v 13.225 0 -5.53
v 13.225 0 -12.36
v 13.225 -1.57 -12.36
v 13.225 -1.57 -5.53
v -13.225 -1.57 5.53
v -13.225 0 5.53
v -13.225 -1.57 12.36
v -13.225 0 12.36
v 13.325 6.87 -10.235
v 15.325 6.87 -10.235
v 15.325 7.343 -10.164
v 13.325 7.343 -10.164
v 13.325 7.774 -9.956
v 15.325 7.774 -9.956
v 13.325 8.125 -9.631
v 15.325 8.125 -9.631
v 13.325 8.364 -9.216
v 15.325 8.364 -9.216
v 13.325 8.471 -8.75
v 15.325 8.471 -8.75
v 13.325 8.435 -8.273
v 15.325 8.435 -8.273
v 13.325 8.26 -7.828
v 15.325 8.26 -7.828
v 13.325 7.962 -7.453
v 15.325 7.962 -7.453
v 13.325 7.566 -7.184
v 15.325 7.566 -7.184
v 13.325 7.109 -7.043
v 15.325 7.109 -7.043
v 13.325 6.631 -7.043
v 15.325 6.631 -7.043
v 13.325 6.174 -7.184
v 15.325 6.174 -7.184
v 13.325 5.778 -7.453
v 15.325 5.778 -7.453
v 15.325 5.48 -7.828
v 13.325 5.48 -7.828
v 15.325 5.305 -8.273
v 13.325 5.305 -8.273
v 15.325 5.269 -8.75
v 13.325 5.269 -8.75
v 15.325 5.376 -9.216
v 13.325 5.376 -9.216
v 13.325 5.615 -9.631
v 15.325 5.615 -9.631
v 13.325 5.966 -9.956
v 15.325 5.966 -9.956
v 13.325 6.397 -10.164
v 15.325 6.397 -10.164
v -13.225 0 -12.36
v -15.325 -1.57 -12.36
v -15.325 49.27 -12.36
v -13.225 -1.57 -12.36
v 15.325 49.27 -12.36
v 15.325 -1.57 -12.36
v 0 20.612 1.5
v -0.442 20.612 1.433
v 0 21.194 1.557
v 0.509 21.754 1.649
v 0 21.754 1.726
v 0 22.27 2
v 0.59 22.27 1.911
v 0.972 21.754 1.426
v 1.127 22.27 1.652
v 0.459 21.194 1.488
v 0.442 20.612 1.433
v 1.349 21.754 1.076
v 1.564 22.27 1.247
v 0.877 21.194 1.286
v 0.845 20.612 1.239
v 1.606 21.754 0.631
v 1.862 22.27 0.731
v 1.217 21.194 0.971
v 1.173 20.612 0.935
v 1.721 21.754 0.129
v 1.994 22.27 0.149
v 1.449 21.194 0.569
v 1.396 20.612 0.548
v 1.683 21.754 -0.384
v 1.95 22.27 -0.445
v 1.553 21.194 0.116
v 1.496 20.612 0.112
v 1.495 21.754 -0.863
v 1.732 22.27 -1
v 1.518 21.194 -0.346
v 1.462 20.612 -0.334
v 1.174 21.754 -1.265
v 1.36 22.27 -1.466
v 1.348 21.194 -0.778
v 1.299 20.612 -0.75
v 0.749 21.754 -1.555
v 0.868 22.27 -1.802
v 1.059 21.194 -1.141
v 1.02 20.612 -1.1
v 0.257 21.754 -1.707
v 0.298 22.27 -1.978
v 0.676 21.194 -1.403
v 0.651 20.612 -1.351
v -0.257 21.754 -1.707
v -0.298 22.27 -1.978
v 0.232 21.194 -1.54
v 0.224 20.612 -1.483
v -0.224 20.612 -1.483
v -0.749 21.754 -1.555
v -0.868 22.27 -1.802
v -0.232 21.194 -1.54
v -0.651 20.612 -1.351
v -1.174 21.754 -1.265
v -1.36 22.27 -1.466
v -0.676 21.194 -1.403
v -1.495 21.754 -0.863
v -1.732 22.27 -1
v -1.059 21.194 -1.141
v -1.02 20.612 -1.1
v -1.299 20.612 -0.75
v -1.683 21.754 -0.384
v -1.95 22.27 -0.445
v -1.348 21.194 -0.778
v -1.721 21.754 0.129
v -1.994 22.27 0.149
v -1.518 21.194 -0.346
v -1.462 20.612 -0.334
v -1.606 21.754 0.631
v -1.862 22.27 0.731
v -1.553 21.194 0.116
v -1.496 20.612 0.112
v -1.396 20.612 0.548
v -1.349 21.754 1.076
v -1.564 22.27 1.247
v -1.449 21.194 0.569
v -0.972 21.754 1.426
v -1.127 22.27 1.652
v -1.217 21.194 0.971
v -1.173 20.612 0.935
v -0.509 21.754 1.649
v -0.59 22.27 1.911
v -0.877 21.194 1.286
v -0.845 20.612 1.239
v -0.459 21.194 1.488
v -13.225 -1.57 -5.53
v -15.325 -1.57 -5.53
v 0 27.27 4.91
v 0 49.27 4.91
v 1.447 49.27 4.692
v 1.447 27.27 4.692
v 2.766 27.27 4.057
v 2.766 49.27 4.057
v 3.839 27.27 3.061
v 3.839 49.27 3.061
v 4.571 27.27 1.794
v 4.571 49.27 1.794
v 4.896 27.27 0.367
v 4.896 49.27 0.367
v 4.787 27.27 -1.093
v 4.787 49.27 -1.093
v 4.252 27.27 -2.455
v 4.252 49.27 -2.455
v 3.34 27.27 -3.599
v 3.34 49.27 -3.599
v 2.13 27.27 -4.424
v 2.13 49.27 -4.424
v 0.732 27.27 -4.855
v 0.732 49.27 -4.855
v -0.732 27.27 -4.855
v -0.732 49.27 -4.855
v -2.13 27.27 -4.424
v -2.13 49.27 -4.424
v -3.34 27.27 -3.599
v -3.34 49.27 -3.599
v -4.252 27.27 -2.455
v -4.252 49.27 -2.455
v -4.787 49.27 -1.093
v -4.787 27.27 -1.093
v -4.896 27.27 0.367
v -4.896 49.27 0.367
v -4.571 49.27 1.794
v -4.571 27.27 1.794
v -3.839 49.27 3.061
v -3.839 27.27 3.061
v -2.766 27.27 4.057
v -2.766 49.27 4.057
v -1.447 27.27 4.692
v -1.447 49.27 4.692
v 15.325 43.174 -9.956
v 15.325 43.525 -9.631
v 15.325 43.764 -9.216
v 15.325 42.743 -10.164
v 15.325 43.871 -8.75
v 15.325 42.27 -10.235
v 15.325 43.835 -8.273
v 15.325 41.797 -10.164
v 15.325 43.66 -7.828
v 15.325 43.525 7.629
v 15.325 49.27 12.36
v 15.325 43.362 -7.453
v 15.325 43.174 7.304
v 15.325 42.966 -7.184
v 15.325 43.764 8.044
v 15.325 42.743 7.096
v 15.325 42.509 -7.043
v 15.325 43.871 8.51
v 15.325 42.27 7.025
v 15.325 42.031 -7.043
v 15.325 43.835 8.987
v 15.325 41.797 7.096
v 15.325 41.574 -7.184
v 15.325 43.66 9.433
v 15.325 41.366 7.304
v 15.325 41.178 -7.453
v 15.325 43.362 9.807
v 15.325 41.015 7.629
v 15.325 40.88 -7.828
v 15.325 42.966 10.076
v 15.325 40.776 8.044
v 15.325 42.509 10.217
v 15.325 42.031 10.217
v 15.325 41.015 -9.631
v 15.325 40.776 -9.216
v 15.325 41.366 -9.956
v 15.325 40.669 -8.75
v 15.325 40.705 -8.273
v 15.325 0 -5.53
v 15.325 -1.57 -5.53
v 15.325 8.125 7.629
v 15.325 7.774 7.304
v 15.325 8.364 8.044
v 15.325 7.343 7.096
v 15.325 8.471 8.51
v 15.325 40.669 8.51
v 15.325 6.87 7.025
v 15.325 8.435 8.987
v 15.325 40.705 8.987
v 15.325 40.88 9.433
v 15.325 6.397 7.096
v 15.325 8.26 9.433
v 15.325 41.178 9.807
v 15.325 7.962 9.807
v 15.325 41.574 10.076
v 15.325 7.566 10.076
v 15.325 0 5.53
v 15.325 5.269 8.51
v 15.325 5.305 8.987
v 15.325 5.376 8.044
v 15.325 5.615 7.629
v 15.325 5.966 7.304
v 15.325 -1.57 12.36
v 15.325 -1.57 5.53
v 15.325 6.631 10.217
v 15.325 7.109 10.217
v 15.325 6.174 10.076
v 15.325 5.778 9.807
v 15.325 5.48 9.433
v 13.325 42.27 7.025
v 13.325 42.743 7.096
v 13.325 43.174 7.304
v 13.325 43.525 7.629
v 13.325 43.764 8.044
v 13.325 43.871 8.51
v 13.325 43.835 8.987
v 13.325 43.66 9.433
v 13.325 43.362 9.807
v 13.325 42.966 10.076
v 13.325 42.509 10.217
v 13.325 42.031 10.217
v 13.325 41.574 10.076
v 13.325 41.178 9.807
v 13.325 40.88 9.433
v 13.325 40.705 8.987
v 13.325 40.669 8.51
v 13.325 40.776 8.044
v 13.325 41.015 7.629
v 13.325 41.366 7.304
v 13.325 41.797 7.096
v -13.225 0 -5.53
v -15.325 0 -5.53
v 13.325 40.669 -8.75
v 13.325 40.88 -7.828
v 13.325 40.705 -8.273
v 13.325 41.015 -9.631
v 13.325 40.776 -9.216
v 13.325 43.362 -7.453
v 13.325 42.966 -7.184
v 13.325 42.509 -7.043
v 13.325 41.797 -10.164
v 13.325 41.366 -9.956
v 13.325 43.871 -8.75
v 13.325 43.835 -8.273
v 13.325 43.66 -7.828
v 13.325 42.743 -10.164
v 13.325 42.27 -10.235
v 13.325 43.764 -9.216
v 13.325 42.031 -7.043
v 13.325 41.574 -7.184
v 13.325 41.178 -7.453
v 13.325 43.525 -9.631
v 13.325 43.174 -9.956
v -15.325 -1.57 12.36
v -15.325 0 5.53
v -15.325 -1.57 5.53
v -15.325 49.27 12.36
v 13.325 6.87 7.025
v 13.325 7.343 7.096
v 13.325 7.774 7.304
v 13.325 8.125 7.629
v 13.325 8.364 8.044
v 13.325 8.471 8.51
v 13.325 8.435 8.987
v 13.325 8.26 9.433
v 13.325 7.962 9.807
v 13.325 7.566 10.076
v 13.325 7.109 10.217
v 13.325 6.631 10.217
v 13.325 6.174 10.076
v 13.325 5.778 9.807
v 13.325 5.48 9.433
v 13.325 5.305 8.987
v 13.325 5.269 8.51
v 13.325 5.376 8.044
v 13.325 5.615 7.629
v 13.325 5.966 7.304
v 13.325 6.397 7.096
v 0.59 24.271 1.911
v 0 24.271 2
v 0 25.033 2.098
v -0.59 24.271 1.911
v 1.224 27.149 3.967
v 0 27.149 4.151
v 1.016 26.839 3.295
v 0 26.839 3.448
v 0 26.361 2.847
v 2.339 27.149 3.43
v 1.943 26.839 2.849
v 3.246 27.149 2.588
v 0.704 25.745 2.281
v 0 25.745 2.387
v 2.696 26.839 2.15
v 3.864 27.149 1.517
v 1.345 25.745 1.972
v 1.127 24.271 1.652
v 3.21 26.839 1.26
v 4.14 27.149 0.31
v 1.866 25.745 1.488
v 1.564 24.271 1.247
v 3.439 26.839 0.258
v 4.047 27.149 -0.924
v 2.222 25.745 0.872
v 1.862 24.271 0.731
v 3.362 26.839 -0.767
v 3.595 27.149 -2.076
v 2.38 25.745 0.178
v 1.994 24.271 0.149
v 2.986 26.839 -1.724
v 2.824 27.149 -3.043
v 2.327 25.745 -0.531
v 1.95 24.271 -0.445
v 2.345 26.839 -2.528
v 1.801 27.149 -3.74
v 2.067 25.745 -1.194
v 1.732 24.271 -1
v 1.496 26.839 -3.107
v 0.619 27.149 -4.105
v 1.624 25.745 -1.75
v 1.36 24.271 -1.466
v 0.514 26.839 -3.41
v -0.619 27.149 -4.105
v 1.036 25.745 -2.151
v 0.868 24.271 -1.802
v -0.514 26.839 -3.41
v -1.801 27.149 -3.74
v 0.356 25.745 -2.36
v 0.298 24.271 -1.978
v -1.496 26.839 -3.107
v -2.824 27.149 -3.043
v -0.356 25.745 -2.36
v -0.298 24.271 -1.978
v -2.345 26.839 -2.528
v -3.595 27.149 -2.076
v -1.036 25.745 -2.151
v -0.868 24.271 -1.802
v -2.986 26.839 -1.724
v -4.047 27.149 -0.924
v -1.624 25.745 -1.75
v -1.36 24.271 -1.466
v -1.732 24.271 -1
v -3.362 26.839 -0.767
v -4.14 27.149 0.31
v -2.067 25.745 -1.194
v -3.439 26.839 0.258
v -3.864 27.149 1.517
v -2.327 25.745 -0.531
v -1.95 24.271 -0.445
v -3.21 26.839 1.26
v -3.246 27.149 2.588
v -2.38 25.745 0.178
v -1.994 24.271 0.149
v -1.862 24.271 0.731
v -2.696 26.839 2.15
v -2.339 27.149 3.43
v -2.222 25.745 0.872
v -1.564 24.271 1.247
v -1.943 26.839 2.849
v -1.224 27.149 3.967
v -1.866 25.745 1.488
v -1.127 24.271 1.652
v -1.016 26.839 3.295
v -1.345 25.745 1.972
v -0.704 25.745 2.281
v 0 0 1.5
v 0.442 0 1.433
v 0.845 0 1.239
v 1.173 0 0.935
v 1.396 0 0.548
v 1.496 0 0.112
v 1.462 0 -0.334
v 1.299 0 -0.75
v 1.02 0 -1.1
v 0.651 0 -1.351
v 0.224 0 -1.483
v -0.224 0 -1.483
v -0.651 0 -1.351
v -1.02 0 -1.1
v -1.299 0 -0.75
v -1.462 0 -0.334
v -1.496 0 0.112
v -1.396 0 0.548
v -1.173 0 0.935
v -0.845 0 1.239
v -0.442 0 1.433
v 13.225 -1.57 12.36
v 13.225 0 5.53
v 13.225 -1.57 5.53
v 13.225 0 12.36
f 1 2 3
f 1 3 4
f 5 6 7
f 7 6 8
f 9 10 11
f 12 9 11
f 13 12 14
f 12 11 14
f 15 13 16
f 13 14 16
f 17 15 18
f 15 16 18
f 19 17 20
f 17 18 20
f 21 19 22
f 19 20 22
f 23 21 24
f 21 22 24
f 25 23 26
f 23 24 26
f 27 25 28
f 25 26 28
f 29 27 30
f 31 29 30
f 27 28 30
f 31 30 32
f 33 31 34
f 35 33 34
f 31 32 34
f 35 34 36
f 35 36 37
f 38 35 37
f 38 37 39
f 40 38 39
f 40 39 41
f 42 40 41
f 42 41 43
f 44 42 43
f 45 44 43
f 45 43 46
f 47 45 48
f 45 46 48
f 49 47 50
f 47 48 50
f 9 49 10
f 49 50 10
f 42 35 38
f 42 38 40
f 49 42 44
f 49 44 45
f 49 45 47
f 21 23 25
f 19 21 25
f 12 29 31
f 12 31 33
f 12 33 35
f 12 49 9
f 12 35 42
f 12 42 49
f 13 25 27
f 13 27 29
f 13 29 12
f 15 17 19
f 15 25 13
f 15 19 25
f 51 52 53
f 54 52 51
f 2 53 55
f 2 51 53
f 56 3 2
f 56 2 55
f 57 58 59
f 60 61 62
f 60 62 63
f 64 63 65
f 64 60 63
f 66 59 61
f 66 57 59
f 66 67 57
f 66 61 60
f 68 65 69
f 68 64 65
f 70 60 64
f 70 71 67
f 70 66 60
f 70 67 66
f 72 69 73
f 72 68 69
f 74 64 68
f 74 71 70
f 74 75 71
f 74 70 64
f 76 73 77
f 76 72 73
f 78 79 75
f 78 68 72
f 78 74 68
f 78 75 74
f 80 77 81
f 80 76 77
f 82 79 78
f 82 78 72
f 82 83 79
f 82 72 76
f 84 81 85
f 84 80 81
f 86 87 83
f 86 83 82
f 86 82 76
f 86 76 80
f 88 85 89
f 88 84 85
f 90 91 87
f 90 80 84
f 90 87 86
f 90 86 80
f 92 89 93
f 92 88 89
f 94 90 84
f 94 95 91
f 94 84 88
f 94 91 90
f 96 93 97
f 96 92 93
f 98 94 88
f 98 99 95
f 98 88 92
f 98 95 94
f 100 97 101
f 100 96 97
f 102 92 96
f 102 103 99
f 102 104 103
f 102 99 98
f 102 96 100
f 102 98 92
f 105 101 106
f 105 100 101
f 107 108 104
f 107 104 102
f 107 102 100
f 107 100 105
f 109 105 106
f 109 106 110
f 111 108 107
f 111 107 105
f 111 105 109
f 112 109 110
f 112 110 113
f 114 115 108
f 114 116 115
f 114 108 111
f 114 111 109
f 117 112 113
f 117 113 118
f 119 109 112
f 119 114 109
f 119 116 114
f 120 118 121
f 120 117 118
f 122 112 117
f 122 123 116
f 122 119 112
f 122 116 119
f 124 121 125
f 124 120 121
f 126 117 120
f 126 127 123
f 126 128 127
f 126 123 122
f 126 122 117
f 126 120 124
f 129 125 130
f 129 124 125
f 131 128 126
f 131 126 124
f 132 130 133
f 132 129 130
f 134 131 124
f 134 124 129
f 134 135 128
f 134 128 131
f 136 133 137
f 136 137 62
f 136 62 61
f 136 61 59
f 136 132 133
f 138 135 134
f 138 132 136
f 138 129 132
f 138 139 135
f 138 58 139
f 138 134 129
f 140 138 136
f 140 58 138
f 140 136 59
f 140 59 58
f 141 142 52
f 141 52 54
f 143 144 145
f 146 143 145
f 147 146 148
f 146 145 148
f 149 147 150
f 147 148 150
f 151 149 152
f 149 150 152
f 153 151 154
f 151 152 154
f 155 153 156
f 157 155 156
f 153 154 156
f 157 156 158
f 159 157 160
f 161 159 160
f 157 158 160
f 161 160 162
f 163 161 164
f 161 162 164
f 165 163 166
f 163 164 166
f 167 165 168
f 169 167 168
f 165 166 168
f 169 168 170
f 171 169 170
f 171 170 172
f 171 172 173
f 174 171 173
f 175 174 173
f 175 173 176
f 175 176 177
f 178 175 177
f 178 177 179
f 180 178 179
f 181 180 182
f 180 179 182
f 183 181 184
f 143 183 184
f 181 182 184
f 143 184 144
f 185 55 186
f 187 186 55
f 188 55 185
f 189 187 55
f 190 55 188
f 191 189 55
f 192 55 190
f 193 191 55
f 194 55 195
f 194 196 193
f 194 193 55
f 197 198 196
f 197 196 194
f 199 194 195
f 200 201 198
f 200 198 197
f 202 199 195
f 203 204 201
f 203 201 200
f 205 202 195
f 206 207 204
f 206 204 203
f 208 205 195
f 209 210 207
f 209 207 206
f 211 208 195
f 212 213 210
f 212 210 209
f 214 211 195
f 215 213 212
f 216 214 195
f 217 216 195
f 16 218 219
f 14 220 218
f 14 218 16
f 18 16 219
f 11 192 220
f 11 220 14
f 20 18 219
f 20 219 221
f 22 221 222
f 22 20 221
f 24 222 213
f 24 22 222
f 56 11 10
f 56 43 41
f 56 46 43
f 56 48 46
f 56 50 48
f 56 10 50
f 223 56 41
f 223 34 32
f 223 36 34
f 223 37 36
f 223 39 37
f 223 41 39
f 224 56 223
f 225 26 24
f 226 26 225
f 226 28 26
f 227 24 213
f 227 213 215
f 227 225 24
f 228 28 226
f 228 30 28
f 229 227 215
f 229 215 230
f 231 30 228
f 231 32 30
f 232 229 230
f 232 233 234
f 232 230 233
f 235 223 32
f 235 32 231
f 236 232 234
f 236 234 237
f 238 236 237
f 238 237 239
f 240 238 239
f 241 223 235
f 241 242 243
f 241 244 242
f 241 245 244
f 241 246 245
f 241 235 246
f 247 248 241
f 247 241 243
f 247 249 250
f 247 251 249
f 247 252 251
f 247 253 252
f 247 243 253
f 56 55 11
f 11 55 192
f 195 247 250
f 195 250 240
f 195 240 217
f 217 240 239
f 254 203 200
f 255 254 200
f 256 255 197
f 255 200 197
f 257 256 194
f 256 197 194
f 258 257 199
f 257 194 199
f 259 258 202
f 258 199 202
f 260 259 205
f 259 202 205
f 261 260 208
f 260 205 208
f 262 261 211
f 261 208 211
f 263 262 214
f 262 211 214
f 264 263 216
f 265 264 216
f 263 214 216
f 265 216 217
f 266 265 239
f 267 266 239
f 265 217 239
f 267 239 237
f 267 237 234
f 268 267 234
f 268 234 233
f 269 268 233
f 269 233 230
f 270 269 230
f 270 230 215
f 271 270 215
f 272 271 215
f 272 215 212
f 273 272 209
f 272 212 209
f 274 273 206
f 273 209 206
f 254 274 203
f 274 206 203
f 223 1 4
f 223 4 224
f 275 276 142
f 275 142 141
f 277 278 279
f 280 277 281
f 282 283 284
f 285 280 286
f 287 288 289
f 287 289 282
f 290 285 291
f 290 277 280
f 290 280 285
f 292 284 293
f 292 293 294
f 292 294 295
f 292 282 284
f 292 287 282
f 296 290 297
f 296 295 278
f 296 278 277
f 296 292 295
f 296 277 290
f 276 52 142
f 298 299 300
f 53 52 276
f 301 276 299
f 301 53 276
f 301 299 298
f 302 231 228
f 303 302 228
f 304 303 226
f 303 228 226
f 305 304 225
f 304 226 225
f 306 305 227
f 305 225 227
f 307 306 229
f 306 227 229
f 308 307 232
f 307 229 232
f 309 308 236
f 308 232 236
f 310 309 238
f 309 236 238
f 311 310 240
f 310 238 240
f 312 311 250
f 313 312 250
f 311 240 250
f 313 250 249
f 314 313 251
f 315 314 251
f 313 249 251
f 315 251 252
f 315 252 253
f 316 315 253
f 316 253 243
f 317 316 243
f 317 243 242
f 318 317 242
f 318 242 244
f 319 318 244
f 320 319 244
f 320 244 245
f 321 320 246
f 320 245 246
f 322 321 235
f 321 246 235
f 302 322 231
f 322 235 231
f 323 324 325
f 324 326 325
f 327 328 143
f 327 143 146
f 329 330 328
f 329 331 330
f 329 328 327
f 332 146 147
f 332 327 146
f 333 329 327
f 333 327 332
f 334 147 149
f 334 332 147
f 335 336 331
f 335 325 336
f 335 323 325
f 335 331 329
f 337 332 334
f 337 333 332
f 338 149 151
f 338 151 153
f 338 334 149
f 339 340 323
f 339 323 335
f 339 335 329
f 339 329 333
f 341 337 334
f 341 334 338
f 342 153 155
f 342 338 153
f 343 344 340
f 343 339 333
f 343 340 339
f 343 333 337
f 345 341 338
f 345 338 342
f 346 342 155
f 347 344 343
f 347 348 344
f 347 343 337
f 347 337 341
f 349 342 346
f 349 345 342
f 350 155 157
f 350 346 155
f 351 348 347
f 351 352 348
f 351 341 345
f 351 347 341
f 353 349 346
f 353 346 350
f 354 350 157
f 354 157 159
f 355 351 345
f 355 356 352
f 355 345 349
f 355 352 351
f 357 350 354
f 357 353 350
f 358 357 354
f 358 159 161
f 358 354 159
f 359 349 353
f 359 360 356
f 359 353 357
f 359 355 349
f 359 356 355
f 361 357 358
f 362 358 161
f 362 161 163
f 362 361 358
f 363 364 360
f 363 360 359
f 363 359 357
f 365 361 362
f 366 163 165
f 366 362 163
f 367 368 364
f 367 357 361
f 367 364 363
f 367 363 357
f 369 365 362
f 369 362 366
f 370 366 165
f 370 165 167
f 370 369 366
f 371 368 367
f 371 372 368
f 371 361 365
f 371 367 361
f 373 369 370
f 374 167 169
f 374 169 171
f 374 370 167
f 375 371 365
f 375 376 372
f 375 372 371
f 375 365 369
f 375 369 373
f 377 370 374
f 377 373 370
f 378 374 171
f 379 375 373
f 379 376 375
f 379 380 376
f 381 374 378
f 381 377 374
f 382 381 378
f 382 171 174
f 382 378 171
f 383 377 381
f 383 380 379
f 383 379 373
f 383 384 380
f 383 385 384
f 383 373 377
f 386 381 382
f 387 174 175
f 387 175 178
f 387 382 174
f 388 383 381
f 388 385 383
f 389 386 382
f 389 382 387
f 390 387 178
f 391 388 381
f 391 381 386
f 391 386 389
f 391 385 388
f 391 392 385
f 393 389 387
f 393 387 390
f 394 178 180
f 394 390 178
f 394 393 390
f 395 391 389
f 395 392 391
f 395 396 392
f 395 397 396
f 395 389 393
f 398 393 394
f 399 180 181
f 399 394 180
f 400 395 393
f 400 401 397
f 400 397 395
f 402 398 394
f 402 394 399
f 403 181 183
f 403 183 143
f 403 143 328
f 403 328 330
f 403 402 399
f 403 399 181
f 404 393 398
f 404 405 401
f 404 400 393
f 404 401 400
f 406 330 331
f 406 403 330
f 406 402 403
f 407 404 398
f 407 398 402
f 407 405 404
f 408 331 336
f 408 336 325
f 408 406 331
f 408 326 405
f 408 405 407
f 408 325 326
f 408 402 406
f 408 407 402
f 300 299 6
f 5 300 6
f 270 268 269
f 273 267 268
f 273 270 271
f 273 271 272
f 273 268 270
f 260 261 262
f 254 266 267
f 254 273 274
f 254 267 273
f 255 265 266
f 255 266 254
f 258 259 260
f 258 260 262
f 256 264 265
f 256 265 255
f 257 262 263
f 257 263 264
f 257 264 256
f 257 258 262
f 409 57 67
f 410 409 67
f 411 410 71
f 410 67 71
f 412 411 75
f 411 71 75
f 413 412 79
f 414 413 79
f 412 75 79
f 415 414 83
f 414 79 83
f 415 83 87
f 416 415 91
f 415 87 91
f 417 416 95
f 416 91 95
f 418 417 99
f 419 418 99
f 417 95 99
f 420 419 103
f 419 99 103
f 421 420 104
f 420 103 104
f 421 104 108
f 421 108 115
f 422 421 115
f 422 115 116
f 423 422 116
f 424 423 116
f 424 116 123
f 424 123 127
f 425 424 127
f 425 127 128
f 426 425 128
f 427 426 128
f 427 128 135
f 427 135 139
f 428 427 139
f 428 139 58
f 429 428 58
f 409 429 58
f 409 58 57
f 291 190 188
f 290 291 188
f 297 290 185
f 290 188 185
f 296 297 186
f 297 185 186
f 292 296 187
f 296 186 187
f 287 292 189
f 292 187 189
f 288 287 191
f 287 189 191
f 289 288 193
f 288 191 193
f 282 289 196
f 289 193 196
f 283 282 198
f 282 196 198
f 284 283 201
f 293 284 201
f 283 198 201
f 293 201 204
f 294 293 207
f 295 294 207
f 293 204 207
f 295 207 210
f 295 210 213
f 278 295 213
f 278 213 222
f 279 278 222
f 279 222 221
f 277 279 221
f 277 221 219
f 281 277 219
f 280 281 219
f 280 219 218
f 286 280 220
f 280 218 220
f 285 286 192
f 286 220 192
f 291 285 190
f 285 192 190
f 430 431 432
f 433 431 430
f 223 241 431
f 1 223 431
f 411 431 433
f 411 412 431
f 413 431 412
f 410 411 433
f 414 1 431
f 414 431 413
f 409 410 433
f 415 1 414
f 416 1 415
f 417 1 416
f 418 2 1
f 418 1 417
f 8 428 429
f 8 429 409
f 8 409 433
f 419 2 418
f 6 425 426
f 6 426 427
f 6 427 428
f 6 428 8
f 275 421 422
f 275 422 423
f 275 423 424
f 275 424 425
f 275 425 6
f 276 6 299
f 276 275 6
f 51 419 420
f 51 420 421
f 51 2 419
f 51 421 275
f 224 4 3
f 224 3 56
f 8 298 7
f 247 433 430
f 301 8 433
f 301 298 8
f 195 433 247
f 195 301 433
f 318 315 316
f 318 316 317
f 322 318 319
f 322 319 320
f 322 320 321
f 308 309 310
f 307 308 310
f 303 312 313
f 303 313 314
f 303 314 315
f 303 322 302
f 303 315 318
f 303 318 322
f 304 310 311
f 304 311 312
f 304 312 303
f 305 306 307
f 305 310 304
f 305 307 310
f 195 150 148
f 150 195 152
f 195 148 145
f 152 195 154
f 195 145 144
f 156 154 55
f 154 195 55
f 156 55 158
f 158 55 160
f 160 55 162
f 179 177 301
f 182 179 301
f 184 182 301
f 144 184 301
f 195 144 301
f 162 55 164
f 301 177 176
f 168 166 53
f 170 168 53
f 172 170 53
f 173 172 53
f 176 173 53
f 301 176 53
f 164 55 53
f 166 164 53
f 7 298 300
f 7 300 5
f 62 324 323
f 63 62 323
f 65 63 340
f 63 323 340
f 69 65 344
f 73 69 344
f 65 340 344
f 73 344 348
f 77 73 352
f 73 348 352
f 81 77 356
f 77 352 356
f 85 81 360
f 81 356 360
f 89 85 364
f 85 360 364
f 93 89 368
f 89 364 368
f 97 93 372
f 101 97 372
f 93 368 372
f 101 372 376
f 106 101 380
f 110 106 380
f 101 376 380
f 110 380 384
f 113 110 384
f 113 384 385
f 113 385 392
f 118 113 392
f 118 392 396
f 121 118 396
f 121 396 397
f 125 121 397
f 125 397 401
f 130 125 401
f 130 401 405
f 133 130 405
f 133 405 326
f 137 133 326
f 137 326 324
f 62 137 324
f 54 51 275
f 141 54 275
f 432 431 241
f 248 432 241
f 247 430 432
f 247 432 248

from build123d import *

# Parameters (mm, degrees)
BOSS_EXTRUDE1_DEPTH = 49.27
SKETCH12_W          = 2.099999999999998
SKETCH12_H          = 6.83
SKETCH12_W_2        = 2.0999999999999996
SKETCH12_H_2        = 6.829999999999998
SKETCH12_W_3        = 2.1000000000000014
BOSS_EXTRUDE2_DEPTH = 1.57
SKETCH4_R           = 4.91
CUT_EXTRUDE3_DEPTH  = 22
SKETCH5_R           = 2
CUT_EXTRUDE4_DEPTH  = 5
SKETCH7_R           = 1.5
CUT_EXTRUDE5_DEPTH  = 34.41594267711148
FILLET4_R           = 3
FILLET5_R           = 3
SKETCH13_R          = 1.6049999999999995
SKETCH13_R_2        = 1.6049999999999962
SKETCH13_R_3        = 1.605
CUT_EXTRUDE6_DEPTH  = 2


with BuildPart() as part:
    # Sketch2 → Boss-Extrude1 (new body)
    with BuildSketch(Plane(origin=(0, 0, 0), x_dir=(1, 0, 0), z_dir=(0, 1, 0))):
        Polygon((-15.325000000000001, 12.36), (15.324999999999998, 12.36), (15.325, -12.360000000000003), (-15.324999999999996, -12.360000000000003), align=None)
    extrude(amount=BOSS_EXTRUDE1_DEPTH)

    # Sketch12 → Boss-Extrude2 (add)
    with BuildSketch(Plane.XZ):
        with Locations((-14.274999999999997, 8.945000000000004)):
            Rectangle(SKETCH12_W, SKETCH12_H)
        with Locations((-14.275000000000002, -8.944999999999999)):
            Rectangle(SKETCH12_W_2, SKETCH12_H_2)
        with Locations((14.274999999999999, 8.945000000000004)):
            Rectangle(SKETCH12_W_3, SKETCH12_H)
        with Locations((14.274999999999999, -8.944999999999999)):
            Rectangle(SKETCH12_W_3, SKETCH12_H_2)
    extrude(amount=BOSS_EXTRUDE2_DEPTH)

    # Sketch4 → Cut-Extrude3 (cut)
    with BuildSketch(Plane(origin=(0, 49.27, 0), x_dir=(1, 0, 0), z_dir=(0, 1, 0))):
        with Locations(Location((0, 0, 0), (0, 0, 270))):
            Circle(SKETCH4_R)
    extrude(amount=-CUT_EXTRUDE3_DEPTH, mode=Mode.SUBTRACT)

    # Sketch5 → Cut-Extrude4 (cut)
    with BuildSketch(Plane(origin=(0, 27.270000000000003, 0), x_dir=(1, 0, 0), z_dir=(0, 1, 0))):
        with Locations(Location((0, 0, 0), (0, 0, 270))):
            Circle(SKETCH5_R)
    extrude(amount=-CUT_EXTRUDE4_DEPTH, mode=Mode.SUBTRACT)

    # Sketch7 → Cut-Extrude5 (cut, through all)
    with BuildSketch(Plane(origin=(0, 22.270000000000003, 0), x_dir=(1, 0, 0), z_dir=(0, 1, 0))):
        with Locations(Location((0, 0, 0), (0, 0, 270))):
            Circle(SKETCH7_R)
    extrude(amount=-CUT_EXTRUDE5_DEPTH, mode=Mode.SUBTRACT)

    # Fillet4
    # the kernel refuses this fillet: 3 mm, written as the material it takes off along each edge
    with BuildSketch(Plane(origin=(0, 27.270000000000003, 0), x_dir=(-1.8e-16, 0, 1), z_dir=(-1, 0, -1.8e-16))) as fillet4_piece_1:
        with BuildLine():
            CenterArc((5, -2.9986496961132367), FILLET4_R, 91.7191313208778, 88.2808686791222)
            Line((2, -2.9986496961132367), (1.94, -2.9986496961132367))
            Line((1.94, -2.9986496961132367), (1.94, 0))
            Line((1.94, 0), (2, 0.05999999999999872))
            ThreePointArc((2, 0.05999999999999872), (3.455, 0.05999999999999872), (4.9082, 0.05997299392226552))
            Line((4.9082, 0.05997299392226552), (4.91, 0))
        make_face()
    revolve(axis=Axis((0, 27.270000000000003, 0), (0, 1, 0)), mode=Mode.SUBTRACT)

    # Fillet5
    # the kernel refuses this fillet: 3 mm, written as the material it takes off along each edge
    with BuildSketch(Plane(origin=(0, 22.270000000000003, 0), x_dir=(-1.8e-16, 0, 1), z_dir=(-1, 0, -1.8e-16))) as fillet5_piece_1:
        with BuildLine():
            CenterArc((4.5, -1.6583123951831418), FILLET5_R, 146.44269023799268, 33.55730976200732)
            Line((2.0000000000025064, -1.66267e-12), (1.9500000000025566, 0.03316624790196698))
            ThreePointArc((1.9500000000025566, 0.03316624790196698), (1.7500000000012532, 0.05999999999999872), (1.5, 0.05999999999999872))
            Line((1.5, 0.05999999999999872), (1.44, 0))
            Line((1.44, 0), (1.44, -1.6583123951831418))
            Line((1.44, -1.6583123951831418), (1.5, -1.6583123951831418))
        make_face()
    revolve(axis=Axis((0, 22.270000000000003, 0), (0, 1, 0)), mode=Mode.SUBTRACT)

    # Sketch13 → Cut-Extrude6 (cut)
    with BuildSketch(Plane(origin=(15.324999999999998, 0, -1.08e-15), x_dir=(-7e-17, 0, -1), z_dir=(1, 0, -7e-17))):
        with Locations((-8.630000000000006, 42.27)):
            Circle(SKETCH13_R)
        with Locations((8.629999999999999, 42.27)):
            Circle(SKETCH13_R_2)
        with Locations((-8.630000000000006, 6.870000000000001)):
            Circle(SKETCH13_R_3)
        with Locations((8.629999999999999, 6.870000000000001)):
            Circle(SKETCH13_R_3)
    extrude(amount=-CUT_EXTRUDE6_DEPTH, mode=Mode.SUBTRACT)


solid = part.part
